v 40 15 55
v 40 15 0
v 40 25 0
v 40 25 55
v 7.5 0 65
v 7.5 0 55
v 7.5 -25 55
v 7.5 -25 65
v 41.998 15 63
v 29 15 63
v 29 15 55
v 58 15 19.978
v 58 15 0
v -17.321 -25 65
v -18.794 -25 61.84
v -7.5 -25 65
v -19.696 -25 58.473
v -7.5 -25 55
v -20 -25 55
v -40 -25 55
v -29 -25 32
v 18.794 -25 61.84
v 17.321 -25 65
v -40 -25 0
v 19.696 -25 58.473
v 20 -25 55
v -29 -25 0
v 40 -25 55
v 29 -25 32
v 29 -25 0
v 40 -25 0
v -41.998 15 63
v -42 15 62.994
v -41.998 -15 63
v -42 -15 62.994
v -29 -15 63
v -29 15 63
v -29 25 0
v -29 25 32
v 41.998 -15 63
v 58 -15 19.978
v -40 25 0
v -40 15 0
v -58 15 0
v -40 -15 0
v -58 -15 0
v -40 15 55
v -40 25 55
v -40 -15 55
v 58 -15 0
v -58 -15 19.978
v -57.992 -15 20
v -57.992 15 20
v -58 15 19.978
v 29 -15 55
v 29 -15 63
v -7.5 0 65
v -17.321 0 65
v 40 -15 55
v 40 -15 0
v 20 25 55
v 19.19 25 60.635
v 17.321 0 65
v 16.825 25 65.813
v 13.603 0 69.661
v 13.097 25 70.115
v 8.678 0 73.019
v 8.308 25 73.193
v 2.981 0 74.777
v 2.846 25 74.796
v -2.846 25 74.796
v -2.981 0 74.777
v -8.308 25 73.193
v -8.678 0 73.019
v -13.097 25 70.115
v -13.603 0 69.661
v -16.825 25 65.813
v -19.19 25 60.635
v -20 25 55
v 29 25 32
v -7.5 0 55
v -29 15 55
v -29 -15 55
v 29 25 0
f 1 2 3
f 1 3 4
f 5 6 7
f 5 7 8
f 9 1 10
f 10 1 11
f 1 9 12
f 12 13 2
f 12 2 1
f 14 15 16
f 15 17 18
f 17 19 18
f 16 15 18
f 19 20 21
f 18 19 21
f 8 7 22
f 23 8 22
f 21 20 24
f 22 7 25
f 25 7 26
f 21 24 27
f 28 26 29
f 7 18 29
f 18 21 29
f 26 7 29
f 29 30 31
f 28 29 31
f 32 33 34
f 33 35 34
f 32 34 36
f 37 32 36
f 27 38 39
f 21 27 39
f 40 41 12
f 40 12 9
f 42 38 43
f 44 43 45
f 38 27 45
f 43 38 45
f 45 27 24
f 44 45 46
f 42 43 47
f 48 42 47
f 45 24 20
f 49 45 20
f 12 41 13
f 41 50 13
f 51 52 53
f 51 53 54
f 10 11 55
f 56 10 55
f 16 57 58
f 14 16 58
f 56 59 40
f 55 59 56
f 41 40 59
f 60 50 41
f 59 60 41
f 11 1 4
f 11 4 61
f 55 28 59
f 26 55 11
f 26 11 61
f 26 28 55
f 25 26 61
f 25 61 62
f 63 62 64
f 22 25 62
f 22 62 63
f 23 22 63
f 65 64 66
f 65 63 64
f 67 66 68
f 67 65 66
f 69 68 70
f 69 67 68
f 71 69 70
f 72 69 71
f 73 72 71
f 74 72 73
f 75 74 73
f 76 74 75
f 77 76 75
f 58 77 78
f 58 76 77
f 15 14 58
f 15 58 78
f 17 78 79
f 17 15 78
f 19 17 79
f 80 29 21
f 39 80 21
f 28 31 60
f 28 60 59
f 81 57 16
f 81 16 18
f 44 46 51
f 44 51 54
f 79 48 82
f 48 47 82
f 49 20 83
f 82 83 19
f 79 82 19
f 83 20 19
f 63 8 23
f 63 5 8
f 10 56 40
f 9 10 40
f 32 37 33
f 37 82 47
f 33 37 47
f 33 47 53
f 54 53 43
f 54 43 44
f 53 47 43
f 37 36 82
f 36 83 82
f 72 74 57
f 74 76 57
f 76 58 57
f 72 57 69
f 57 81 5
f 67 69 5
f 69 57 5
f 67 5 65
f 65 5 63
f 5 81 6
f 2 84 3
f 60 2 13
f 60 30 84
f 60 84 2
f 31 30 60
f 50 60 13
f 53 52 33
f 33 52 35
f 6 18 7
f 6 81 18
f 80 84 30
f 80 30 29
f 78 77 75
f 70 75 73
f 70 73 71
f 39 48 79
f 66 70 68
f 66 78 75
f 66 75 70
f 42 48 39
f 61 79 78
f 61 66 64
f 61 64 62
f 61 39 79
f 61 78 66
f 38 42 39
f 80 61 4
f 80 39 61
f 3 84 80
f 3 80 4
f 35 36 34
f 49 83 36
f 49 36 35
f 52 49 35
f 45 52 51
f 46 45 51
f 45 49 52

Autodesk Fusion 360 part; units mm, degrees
sketch "Sketch1" plane through (0, 0, 0) normal (0, 1, 0) x (1, 0, 0)
  line L0 (29, 0) -> (40, 0)
  line L1 (40, 0) -> (40, -55)
  line L2 (40, -55) -> (20, -55)
  line L3 (0, -55) -> (0, -32)
  line L4 (0, -70) -> (0, -85)
  line L5 (0, -35) -> (0, -32)
  line L6 (-29, 0) -> (-40, 0)
  line L7 (-40, 0) -> (-40, -55)
  line L8 (-40, -55) -> (-20, -55)
  line L9 (29, 0) -> (29, -32)
  line L10 (29, -32) -> (0, -32)
  line L11 (-29, -32) -> (0, -32)
  line L12 (-29, 0) -> (-29, -32)
  arc A0 (-20, -55) -> (20, -55) centre (0, -55) ccw
  dimension "d1" = 40
  dimension "d2" = 55
  dimension "d3" = 29
  dimension "d4" = 32
  dimension "d5" = 40
extrude "Extrude1" add sketch "Sketch1" along normal mid plane 50
sketch "Sketch2" plane through (0, 0, 32) normal (0, 0, -1) x (1, 0, 0)
  line L0 (-29, 25) -> (-29, -25)
  line L1 (-29, -25) -> (29, -25)
  line L2 (29, -25) -> (29, 25)
  line L3 (29, 25) -> (-29, 25)
  line L4 (40, 15) -> (27, 15)
  line L5 (27, 15) -> (27, -15)
  line L6 (27, -15) -> (40, -15)
  line L7 (40, 15) -> (58, 15)
  line L8 (58, 15) -> (58, -15)
  line L9 (58, -15) -> (40, -15)
  line L10 (0, -35) -> (0, -40)
  line L11 (-58, -15) -> (-40, -15)
  line L12 (-27, -15) -> (-40, -15)
  line L13 (-27, 15) -> (-27, -15)
  line L14 (-40, 15) -> (-27, 15)
  line L15 (-40, 15) -> (-58, 15)
  line L16 (-58, 15) -> (-58, -15)
  dimension "d9" = 13
  dimension "d10" = 30
  dimension "d11" = 18
  dimension "d12" = 30
extrude "Extrude2" add sketch "Sketch2" against normal blind 63 from surface at 32 contours L0 L11 L12 L14 L15 L16 | L2 L4 L6 L7 L8 L9
sketch "Sketch3" plane through (0, 0, 0) normal (0, 1, 0) x (1, 0, 0)
  line L0 (-7.5, -65) -> (-7.5, -55)
  line L1 (7.5, -55) -> (7.5, -65)
  line L2 (-7.5, -55) -> (7.5, -55)
  line L3 (0, -85) -> (0, -96)
  line L4 (-57.9919, -20) -> (-42, -62.9941)
  line L5 (-42, -62.9941) -> (-63.2403, -5.8898)
  line L6 (-63.2403, -5.8898) -> (-39.5238, -69.6512)
  line L7 (-39.5238, -69.6512) -> (-63.2403, -69.6512)
  line L8 (-63.2403, -69.6512) -> (-63.2403, -5.8898)
  line L9 (39.5238, -69.6512) -> (63.2403, -69.6512)
  line L10 (63.2403, -5.8898) -> (39.5238, -69.6512)
  line L11 (63.2403, -69.6512) -> (63.2403, -5.8898)
  line L12 (-7.5, -65) -> (-20, -65)
  line L13 (7.5, -65) -> (20.2492, -65)
  arc A0 (-20, -65) -> (20.2492, -65) centre (0.1246, -54.9377) ccw
  dimension "d24" = 45
extrude "Extrude3" cut sketch "Sketch3" along normal mid plane 70 contours L4 L5 L6 L7 L8 | L9 L10 L11
extrude "Extrude4" cut sketch "Sketch3" against normal blind 30 contours L0 L1 L2 L12 L13 A0
